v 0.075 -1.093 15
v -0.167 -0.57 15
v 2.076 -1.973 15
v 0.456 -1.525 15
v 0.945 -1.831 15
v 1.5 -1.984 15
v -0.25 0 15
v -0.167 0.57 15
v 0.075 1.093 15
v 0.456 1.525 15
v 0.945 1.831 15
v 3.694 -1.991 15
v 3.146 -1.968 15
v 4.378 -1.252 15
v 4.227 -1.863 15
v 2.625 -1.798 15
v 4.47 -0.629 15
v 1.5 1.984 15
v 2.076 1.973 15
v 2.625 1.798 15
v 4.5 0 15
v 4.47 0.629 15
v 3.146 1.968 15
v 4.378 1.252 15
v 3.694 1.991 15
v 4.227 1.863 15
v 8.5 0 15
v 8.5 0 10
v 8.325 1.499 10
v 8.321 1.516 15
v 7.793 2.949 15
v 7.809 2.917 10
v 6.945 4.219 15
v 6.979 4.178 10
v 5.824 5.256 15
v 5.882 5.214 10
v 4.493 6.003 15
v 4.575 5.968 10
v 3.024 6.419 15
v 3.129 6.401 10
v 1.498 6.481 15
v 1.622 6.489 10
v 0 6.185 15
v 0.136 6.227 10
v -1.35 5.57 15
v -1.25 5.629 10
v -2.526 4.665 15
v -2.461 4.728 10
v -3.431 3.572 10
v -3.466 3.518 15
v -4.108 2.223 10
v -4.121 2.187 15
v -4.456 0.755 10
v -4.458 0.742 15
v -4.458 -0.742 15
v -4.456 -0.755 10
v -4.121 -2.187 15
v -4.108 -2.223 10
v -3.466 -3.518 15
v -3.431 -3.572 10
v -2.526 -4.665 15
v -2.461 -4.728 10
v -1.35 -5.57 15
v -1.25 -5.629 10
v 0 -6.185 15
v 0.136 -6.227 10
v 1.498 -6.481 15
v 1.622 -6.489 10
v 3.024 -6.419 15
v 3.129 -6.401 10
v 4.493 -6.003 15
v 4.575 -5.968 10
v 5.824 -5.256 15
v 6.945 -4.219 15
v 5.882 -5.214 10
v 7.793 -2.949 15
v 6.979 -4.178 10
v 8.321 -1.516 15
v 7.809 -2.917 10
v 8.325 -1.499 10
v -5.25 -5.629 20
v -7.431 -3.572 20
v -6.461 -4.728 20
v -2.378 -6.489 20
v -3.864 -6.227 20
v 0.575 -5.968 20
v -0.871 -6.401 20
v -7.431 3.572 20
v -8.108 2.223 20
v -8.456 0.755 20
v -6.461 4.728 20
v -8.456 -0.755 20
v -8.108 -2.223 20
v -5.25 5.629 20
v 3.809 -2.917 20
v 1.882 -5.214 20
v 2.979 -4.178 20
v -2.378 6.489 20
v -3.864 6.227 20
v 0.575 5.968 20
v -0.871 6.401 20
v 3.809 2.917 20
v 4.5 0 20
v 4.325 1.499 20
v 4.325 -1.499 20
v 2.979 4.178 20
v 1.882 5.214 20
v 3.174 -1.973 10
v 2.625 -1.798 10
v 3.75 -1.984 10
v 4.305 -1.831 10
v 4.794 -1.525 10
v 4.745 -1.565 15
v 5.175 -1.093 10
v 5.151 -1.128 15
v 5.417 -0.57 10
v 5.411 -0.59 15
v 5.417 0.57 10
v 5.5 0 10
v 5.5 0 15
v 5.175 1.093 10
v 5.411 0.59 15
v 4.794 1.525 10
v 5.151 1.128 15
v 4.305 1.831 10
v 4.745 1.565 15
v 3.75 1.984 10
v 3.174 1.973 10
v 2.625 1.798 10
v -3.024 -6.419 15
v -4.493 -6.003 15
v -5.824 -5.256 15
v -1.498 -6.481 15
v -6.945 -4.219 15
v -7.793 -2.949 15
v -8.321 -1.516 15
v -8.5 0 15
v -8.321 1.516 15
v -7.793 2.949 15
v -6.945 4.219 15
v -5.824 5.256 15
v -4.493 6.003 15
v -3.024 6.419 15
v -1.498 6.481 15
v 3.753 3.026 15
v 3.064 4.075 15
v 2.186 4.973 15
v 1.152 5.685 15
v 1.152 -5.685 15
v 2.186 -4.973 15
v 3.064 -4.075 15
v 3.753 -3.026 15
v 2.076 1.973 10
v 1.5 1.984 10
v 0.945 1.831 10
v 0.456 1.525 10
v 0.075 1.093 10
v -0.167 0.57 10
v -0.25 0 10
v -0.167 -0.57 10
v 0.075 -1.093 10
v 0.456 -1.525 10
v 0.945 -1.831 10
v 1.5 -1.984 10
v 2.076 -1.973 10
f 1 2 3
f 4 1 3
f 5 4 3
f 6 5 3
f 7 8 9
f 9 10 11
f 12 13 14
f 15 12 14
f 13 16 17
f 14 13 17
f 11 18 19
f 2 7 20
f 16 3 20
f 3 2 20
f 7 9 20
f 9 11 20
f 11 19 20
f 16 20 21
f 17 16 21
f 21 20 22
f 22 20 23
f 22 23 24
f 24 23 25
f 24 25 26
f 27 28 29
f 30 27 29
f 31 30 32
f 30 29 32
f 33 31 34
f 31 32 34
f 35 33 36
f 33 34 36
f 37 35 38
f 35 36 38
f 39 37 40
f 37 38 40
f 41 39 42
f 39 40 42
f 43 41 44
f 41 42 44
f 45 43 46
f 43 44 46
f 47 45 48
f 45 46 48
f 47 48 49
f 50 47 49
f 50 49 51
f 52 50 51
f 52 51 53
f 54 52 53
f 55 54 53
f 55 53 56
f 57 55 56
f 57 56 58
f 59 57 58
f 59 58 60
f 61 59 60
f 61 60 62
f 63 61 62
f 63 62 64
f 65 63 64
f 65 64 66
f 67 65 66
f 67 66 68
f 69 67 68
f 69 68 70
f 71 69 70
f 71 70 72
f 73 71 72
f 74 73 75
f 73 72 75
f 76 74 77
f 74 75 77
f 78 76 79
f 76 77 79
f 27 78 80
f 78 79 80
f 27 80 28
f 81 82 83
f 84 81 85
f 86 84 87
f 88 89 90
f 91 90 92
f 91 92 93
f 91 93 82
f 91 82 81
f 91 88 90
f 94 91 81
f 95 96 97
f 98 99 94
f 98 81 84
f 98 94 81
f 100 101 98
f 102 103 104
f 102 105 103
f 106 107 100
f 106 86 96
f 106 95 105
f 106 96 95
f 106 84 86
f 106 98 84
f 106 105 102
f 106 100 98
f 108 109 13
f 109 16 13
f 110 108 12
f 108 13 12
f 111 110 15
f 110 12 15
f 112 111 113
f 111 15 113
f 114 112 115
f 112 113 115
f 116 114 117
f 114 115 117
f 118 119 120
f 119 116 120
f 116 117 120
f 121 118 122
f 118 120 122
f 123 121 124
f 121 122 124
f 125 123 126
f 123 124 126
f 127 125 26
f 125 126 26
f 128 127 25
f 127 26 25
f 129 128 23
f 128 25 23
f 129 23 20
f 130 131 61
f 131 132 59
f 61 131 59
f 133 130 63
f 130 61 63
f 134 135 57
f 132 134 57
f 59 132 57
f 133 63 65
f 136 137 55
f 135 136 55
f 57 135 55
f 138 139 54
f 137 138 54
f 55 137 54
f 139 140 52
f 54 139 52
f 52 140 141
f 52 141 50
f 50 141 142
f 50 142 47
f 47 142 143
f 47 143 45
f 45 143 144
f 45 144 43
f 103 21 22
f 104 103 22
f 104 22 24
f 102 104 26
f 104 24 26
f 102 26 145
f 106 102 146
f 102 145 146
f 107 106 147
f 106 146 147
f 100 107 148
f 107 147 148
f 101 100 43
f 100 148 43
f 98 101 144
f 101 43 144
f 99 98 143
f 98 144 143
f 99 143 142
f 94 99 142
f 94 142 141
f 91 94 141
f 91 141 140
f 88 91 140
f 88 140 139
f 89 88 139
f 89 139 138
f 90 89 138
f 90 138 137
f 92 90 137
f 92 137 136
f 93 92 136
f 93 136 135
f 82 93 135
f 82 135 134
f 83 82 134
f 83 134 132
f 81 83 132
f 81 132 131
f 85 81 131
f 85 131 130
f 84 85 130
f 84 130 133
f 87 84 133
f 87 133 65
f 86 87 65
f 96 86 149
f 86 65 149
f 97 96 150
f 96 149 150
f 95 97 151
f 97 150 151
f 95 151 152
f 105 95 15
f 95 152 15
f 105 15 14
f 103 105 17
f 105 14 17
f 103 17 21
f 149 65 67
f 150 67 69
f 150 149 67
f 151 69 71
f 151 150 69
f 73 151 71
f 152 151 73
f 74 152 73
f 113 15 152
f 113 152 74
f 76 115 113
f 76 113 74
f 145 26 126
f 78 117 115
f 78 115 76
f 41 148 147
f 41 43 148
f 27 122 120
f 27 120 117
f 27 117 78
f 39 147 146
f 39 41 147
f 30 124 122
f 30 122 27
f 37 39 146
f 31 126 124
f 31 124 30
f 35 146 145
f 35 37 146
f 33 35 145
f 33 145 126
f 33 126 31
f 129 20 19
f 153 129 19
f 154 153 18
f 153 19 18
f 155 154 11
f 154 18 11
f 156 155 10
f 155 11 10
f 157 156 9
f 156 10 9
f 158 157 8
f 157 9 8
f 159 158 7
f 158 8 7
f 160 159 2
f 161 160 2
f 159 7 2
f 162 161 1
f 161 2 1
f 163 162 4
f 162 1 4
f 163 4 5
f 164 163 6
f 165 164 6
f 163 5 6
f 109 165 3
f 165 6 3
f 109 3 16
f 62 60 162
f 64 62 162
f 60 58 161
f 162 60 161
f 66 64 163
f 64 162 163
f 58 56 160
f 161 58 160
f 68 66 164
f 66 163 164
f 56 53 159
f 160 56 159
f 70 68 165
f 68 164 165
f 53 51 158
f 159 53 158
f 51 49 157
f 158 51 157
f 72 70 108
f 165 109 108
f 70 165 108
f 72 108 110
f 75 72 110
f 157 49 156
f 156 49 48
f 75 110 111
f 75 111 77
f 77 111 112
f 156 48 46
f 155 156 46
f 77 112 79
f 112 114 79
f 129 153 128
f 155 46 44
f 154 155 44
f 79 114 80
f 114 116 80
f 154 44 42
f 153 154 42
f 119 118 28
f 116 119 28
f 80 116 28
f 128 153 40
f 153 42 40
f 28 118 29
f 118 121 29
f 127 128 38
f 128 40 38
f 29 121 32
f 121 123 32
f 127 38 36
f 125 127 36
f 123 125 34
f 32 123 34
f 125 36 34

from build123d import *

# Parameters (mm, degrees)
KEY1SKETCH_R       = 6.5
KEYPADPAD_DEPTH    = 5
KEY2SKETCH_R       = 6.5
KEYPADPAD001_DEPTH = 5
PIN1SKETCH001_R    = 2
PIN1POCKET_DEPTH   = 10
PIN2SKETCH001_R    = 2
PIN2POCKET_DEPTH   = 10


with BuildPart() as part:
    # key1Sketch → keyPadPad (new body)
    with BuildSketch(Plane.XY):
        with Locations((2, 0)):
            Circle(KEY1SKETCH_R)
    extrude(amount=KEYPADPAD_DEPTH)

    # key2Sketch → keyPadPad001 (join)
    with BuildSketch(Plane.XY.offset(5)):
        with Locations((-2, 0)):
            Circle(KEY2SKETCH_R)
    extrude(amount=KEYPADPAD001_DEPTH)

    # Pin1Sketch001 → Pin1Pocket (cut)
    with BuildSketch(Plane.XY.offset(5)):
        with Locations((1.75, 0)):
            Circle(PIN1SKETCH001_R)
    extrude(amount=-PIN1POCKET_DEPTH, mode=Mode.SUBTRACT)

    # Pin2Sketch001 → Pin2Pocket (cut)
    with BuildSketch(Plane.XY.offset(5)):
        with Locations((3.5, 0)):
            Circle(PIN2SKETCH001_R)
    extrude(amount=-PIN2POCKET_DEPTH, mode=Mode.SUBTRACT)


with BuildPart() as part_1:
    # eccentricKey placement: moved
    add(part.part.moved(Location((0, 0, 10))))


solid = part_1.part
